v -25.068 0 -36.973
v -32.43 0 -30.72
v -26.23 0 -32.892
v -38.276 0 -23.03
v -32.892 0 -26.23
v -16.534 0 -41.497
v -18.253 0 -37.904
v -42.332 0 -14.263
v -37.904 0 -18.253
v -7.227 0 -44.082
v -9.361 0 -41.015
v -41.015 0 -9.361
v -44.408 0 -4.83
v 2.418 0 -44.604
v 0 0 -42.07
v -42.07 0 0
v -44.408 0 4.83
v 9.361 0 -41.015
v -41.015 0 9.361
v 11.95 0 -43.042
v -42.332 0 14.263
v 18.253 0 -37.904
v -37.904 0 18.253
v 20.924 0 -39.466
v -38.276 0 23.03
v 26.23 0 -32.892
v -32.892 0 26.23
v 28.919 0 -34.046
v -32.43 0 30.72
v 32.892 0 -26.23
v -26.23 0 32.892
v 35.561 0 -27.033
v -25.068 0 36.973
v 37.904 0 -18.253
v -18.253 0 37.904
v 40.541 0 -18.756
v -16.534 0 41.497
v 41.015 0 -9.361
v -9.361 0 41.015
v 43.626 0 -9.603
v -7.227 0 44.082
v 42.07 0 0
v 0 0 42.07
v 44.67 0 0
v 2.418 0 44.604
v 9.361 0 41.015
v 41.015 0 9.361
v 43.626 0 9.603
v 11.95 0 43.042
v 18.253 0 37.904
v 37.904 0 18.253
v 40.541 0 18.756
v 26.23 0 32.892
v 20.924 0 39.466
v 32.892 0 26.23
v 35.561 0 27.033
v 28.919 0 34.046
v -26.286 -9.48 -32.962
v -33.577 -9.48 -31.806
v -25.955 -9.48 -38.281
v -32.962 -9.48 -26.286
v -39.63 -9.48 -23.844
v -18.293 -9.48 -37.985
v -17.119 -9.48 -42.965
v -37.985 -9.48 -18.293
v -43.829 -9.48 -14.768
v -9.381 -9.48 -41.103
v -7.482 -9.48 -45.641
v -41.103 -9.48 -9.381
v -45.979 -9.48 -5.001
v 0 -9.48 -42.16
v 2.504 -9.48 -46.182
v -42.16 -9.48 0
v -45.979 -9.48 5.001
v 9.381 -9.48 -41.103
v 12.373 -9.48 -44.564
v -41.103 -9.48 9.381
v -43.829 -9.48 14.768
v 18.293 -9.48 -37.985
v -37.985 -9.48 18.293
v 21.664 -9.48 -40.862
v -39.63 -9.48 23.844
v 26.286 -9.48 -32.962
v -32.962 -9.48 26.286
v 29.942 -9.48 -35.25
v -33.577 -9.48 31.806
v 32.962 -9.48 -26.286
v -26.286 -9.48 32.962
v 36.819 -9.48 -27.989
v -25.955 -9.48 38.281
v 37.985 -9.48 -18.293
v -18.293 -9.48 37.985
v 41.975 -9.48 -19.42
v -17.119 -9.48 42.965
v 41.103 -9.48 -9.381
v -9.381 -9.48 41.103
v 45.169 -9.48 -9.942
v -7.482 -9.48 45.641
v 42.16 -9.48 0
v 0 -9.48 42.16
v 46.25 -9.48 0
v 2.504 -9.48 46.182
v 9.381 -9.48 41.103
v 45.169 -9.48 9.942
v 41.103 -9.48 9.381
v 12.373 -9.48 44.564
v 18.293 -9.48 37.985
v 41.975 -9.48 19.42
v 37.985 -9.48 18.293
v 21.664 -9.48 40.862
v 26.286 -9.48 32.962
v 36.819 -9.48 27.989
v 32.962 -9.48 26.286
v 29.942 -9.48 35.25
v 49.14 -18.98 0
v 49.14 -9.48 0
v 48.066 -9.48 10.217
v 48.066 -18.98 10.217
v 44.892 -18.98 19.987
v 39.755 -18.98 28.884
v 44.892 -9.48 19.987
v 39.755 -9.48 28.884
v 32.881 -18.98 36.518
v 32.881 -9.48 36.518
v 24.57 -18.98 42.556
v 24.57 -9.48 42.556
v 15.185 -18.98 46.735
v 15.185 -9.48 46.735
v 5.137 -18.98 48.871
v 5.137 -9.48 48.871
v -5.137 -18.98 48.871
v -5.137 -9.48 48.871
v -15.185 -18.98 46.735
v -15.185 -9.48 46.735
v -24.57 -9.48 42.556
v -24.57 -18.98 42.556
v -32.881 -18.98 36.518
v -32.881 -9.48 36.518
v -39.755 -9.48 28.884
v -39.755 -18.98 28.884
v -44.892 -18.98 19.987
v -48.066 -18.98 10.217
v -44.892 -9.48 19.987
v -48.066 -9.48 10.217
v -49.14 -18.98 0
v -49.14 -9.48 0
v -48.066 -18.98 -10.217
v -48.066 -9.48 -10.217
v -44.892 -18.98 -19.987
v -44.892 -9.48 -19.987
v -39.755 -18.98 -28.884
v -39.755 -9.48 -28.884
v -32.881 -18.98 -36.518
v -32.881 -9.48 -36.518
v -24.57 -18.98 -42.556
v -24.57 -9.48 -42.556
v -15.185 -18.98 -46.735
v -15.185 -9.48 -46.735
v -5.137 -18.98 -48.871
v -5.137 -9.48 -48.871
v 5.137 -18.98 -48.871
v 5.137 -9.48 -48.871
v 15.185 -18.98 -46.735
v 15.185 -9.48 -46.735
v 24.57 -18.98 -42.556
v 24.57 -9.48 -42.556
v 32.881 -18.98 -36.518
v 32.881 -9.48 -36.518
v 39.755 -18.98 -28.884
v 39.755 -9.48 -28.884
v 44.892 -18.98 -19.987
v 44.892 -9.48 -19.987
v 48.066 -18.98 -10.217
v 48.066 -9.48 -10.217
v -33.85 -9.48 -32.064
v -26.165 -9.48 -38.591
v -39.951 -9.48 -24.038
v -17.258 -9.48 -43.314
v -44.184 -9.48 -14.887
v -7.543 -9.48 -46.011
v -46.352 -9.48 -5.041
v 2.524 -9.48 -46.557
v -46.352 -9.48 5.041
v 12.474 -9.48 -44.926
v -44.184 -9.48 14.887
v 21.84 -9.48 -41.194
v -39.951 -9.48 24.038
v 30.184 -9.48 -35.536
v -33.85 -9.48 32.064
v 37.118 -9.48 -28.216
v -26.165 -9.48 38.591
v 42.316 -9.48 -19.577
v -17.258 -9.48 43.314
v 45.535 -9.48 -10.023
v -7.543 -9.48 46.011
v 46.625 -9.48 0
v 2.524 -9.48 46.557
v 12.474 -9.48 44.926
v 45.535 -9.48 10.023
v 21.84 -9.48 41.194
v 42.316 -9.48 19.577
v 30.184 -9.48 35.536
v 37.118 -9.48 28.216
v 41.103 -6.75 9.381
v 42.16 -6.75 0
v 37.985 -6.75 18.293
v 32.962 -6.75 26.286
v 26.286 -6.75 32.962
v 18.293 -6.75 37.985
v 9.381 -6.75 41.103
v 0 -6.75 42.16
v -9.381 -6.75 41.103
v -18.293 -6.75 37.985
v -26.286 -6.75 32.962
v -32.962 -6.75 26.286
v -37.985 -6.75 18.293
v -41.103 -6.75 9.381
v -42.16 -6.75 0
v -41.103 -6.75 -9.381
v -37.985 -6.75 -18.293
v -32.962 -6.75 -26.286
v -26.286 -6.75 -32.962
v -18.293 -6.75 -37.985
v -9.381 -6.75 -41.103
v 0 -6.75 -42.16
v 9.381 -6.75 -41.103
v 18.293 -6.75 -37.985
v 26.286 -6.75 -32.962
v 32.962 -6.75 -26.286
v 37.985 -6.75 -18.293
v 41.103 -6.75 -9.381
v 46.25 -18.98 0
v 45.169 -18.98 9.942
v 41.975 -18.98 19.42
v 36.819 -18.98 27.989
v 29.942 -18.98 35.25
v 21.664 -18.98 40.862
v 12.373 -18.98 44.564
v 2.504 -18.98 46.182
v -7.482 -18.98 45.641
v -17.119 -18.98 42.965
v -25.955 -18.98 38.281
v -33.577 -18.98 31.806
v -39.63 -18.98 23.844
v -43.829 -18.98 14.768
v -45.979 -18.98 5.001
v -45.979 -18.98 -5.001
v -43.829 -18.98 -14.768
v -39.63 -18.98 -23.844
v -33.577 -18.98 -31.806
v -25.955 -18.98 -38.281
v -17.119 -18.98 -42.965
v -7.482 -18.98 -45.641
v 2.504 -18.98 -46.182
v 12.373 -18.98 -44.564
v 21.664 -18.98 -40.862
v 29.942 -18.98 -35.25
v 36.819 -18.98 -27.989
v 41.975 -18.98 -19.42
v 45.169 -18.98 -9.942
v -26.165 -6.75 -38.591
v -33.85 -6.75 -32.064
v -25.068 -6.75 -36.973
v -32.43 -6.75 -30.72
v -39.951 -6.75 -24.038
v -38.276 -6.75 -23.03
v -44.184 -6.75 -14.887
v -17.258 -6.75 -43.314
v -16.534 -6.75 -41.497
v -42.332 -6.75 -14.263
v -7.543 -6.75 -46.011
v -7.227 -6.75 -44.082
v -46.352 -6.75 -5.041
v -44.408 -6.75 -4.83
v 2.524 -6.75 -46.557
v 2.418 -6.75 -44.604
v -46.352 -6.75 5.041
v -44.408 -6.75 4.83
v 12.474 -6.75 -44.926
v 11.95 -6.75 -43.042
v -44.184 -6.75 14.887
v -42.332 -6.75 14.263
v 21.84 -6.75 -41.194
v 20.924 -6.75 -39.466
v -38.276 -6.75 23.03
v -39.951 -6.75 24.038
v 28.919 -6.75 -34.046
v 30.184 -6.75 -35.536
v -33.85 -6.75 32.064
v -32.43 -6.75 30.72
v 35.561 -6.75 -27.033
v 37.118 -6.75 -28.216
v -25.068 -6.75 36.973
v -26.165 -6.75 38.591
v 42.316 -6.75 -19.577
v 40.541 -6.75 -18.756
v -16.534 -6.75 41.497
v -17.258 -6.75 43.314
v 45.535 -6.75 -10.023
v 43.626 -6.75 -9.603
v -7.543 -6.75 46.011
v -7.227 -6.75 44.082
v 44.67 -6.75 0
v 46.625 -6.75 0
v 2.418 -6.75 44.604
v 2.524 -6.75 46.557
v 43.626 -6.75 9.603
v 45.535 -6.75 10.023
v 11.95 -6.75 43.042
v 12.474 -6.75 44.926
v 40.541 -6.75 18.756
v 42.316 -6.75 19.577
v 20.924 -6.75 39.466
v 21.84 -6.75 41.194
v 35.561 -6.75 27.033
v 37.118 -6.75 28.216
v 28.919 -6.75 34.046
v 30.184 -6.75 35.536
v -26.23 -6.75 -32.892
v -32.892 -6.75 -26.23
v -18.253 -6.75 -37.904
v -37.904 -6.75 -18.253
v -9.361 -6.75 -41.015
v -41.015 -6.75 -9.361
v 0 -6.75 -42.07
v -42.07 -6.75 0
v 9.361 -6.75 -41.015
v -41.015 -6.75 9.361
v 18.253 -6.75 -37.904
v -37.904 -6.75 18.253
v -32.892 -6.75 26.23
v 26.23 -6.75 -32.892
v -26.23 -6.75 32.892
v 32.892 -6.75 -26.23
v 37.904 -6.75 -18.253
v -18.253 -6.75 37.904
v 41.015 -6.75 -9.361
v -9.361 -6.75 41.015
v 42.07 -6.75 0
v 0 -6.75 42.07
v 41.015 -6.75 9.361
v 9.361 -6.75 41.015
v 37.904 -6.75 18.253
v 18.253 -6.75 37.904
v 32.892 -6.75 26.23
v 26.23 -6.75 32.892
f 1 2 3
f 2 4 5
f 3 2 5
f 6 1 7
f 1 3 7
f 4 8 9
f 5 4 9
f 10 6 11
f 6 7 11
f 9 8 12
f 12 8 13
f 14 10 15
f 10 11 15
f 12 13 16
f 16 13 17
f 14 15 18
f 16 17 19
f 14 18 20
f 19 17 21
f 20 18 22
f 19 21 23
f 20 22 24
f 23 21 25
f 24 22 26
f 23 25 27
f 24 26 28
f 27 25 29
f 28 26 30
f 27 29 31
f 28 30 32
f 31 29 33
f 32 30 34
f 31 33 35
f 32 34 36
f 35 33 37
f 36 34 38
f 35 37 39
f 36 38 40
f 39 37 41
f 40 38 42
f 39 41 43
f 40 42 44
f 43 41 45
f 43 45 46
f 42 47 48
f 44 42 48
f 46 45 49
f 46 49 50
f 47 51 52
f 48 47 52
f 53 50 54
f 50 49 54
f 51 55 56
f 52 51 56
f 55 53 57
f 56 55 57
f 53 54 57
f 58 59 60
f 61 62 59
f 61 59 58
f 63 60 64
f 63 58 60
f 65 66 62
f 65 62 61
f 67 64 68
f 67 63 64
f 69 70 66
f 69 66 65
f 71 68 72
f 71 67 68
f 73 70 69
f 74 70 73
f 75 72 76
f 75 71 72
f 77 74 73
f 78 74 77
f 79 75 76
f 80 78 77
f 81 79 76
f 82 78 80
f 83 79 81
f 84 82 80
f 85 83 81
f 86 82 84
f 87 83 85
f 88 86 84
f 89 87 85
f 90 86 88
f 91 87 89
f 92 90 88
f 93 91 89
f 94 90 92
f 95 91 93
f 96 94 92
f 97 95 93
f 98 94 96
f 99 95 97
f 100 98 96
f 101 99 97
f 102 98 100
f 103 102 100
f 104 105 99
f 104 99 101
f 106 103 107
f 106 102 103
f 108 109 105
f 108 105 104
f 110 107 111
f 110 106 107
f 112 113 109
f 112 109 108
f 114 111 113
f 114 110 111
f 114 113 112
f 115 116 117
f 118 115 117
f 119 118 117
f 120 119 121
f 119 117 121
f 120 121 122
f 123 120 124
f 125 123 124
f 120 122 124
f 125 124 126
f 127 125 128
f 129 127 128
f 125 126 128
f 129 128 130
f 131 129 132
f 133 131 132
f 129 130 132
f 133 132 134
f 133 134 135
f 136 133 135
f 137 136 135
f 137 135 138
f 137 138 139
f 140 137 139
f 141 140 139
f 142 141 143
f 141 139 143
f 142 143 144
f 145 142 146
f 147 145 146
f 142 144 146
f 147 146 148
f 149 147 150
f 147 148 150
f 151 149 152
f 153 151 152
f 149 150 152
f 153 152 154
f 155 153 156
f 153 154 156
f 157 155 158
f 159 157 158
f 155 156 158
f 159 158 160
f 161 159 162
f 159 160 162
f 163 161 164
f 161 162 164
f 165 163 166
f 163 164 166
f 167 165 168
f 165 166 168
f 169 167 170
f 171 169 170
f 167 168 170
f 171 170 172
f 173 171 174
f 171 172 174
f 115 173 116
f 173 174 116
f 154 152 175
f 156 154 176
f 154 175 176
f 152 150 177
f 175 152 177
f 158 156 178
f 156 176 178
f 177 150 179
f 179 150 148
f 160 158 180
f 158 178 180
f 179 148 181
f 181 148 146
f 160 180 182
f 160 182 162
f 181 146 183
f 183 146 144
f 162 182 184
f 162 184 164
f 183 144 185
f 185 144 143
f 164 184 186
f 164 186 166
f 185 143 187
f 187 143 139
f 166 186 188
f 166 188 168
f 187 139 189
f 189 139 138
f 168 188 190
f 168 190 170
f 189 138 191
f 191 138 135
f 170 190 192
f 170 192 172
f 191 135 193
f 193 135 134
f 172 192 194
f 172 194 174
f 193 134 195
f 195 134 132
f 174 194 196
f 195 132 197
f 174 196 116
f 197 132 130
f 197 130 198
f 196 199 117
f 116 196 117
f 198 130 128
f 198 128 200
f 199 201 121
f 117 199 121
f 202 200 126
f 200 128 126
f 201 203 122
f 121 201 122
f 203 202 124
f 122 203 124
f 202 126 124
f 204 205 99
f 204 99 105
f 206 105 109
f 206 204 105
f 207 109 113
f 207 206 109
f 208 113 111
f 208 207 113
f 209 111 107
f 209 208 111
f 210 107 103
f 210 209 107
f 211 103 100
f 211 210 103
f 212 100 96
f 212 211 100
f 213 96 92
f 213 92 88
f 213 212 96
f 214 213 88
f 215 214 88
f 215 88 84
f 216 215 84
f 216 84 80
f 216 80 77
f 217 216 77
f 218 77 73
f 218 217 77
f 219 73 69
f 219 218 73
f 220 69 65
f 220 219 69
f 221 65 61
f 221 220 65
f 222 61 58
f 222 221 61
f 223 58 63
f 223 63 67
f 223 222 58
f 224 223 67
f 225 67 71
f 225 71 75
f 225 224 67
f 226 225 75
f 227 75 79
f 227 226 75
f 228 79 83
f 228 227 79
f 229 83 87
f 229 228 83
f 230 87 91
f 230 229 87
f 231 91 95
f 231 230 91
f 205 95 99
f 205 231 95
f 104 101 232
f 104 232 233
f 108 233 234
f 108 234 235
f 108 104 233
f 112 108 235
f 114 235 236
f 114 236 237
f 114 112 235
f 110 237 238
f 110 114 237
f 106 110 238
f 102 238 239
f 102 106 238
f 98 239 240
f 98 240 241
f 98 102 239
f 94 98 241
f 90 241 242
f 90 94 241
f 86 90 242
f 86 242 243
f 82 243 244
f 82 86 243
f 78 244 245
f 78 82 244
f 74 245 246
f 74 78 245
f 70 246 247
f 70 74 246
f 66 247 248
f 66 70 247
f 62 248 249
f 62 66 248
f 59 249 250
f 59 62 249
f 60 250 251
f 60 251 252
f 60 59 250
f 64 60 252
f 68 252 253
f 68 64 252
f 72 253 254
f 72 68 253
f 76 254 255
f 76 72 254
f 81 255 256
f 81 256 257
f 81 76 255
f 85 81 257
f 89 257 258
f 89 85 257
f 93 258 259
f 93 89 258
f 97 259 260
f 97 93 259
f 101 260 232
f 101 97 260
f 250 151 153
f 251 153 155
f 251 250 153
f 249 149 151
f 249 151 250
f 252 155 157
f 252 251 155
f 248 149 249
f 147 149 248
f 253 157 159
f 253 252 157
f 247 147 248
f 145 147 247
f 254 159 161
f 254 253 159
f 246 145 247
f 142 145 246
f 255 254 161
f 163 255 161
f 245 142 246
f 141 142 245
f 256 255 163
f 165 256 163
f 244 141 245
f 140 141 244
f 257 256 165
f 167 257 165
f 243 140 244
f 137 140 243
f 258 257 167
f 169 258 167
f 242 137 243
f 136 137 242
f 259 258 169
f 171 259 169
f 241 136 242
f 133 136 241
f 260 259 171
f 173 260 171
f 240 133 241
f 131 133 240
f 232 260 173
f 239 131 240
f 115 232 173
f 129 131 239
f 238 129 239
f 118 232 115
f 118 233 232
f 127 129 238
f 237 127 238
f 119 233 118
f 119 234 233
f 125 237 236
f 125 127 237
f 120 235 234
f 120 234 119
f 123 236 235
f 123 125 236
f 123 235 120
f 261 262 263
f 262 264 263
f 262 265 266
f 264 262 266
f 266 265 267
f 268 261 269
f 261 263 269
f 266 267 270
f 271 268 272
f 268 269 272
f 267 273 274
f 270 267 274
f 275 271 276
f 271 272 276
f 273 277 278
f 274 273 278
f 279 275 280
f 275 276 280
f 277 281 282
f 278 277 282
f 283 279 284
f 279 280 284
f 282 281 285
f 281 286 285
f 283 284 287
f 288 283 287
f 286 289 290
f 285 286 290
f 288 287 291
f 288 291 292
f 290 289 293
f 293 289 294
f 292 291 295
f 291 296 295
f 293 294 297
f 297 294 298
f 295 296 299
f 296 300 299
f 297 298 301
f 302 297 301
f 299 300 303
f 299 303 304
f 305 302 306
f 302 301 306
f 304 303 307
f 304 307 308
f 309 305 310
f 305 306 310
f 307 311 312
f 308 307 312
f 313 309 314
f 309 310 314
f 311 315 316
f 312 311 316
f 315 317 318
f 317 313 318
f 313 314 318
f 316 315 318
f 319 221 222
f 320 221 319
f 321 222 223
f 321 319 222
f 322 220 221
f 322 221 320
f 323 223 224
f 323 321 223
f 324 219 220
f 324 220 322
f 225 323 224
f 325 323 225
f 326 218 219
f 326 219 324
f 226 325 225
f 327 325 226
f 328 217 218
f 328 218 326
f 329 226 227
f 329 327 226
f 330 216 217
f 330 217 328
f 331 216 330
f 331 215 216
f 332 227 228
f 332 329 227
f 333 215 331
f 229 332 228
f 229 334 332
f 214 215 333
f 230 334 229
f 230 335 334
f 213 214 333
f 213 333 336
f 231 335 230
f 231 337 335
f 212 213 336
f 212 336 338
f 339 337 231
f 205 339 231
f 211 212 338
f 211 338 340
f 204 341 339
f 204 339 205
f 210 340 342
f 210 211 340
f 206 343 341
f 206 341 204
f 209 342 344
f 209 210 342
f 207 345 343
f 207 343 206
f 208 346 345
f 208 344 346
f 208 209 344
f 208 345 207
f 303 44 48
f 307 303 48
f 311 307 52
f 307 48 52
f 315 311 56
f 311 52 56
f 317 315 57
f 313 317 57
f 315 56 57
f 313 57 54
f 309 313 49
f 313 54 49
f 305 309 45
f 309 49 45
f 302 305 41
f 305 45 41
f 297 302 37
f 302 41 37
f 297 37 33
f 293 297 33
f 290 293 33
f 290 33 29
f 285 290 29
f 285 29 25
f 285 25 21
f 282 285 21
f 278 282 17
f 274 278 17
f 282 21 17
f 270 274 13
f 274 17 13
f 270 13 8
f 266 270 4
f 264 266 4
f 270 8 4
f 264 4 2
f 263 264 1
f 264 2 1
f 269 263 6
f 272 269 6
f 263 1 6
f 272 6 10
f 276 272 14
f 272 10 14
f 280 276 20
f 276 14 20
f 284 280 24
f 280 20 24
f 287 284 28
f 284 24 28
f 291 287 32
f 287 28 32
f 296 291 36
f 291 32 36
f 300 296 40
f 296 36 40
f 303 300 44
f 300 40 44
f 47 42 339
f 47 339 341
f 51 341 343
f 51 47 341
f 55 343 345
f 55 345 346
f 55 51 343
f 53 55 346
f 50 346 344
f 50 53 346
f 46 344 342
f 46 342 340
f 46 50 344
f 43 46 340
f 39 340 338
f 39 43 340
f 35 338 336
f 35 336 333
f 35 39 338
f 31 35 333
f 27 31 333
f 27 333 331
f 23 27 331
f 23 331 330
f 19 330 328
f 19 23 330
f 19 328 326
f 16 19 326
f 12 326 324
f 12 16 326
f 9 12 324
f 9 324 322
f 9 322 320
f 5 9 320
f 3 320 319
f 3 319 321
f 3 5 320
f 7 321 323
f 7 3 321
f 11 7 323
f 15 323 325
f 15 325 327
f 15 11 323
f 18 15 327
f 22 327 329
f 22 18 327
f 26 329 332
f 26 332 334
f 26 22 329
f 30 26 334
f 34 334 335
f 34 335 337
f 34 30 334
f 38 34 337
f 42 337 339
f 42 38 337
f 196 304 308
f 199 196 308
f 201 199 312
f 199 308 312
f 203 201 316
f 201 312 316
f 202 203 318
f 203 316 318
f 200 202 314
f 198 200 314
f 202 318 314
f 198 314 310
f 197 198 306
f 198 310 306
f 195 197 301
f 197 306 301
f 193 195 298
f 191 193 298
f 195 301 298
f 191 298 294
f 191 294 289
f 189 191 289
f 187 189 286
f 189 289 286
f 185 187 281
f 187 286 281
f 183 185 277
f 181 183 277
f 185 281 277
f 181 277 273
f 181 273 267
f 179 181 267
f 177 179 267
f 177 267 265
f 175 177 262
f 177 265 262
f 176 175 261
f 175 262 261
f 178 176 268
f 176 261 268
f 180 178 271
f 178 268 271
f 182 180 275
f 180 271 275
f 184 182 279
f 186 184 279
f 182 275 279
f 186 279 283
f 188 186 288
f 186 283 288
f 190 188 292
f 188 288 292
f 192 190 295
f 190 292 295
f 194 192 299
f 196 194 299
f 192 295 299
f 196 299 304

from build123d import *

# Parameters (mm, degrees)
F0_R     = 44.67
F0_R_2   = 42.07
F1_DEPTH = 6.75
F2_R     = 46.625
F2_R_2   = 42.16
F3_DEPTH = 2.73
F4_R     = 49.14
F4_R_2   = 46.25
F5_DEPTH = 9.5


with BuildPart() as f1:
    # F0 (on Front) → F1 (new body)
    with BuildSketch(Plane.XZ):
        Circle(F0_R)
        Circle(F0_R_2, mode=Mode.SUBTRACT)
    extrude(amount=F1_DEPTH)

    # F2 (on face) → F3 (join)
    with BuildSketch(Plane.XZ.offset(6.75)):
        Circle(F2_R)
        Circle(F2_R_2, mode=Mode.SUBTRACT)
    extrude(amount=F3_DEPTH)

    # F4 (on face) → F5 (join)
    with BuildSketch(Plane.XZ.offset(9.48)):
        Circle(F4_R)
        Circle(F4_R_2, mode=Mode.SUBTRACT)
    extrude(amount=F5_DEPTH)


solid = f1.part
